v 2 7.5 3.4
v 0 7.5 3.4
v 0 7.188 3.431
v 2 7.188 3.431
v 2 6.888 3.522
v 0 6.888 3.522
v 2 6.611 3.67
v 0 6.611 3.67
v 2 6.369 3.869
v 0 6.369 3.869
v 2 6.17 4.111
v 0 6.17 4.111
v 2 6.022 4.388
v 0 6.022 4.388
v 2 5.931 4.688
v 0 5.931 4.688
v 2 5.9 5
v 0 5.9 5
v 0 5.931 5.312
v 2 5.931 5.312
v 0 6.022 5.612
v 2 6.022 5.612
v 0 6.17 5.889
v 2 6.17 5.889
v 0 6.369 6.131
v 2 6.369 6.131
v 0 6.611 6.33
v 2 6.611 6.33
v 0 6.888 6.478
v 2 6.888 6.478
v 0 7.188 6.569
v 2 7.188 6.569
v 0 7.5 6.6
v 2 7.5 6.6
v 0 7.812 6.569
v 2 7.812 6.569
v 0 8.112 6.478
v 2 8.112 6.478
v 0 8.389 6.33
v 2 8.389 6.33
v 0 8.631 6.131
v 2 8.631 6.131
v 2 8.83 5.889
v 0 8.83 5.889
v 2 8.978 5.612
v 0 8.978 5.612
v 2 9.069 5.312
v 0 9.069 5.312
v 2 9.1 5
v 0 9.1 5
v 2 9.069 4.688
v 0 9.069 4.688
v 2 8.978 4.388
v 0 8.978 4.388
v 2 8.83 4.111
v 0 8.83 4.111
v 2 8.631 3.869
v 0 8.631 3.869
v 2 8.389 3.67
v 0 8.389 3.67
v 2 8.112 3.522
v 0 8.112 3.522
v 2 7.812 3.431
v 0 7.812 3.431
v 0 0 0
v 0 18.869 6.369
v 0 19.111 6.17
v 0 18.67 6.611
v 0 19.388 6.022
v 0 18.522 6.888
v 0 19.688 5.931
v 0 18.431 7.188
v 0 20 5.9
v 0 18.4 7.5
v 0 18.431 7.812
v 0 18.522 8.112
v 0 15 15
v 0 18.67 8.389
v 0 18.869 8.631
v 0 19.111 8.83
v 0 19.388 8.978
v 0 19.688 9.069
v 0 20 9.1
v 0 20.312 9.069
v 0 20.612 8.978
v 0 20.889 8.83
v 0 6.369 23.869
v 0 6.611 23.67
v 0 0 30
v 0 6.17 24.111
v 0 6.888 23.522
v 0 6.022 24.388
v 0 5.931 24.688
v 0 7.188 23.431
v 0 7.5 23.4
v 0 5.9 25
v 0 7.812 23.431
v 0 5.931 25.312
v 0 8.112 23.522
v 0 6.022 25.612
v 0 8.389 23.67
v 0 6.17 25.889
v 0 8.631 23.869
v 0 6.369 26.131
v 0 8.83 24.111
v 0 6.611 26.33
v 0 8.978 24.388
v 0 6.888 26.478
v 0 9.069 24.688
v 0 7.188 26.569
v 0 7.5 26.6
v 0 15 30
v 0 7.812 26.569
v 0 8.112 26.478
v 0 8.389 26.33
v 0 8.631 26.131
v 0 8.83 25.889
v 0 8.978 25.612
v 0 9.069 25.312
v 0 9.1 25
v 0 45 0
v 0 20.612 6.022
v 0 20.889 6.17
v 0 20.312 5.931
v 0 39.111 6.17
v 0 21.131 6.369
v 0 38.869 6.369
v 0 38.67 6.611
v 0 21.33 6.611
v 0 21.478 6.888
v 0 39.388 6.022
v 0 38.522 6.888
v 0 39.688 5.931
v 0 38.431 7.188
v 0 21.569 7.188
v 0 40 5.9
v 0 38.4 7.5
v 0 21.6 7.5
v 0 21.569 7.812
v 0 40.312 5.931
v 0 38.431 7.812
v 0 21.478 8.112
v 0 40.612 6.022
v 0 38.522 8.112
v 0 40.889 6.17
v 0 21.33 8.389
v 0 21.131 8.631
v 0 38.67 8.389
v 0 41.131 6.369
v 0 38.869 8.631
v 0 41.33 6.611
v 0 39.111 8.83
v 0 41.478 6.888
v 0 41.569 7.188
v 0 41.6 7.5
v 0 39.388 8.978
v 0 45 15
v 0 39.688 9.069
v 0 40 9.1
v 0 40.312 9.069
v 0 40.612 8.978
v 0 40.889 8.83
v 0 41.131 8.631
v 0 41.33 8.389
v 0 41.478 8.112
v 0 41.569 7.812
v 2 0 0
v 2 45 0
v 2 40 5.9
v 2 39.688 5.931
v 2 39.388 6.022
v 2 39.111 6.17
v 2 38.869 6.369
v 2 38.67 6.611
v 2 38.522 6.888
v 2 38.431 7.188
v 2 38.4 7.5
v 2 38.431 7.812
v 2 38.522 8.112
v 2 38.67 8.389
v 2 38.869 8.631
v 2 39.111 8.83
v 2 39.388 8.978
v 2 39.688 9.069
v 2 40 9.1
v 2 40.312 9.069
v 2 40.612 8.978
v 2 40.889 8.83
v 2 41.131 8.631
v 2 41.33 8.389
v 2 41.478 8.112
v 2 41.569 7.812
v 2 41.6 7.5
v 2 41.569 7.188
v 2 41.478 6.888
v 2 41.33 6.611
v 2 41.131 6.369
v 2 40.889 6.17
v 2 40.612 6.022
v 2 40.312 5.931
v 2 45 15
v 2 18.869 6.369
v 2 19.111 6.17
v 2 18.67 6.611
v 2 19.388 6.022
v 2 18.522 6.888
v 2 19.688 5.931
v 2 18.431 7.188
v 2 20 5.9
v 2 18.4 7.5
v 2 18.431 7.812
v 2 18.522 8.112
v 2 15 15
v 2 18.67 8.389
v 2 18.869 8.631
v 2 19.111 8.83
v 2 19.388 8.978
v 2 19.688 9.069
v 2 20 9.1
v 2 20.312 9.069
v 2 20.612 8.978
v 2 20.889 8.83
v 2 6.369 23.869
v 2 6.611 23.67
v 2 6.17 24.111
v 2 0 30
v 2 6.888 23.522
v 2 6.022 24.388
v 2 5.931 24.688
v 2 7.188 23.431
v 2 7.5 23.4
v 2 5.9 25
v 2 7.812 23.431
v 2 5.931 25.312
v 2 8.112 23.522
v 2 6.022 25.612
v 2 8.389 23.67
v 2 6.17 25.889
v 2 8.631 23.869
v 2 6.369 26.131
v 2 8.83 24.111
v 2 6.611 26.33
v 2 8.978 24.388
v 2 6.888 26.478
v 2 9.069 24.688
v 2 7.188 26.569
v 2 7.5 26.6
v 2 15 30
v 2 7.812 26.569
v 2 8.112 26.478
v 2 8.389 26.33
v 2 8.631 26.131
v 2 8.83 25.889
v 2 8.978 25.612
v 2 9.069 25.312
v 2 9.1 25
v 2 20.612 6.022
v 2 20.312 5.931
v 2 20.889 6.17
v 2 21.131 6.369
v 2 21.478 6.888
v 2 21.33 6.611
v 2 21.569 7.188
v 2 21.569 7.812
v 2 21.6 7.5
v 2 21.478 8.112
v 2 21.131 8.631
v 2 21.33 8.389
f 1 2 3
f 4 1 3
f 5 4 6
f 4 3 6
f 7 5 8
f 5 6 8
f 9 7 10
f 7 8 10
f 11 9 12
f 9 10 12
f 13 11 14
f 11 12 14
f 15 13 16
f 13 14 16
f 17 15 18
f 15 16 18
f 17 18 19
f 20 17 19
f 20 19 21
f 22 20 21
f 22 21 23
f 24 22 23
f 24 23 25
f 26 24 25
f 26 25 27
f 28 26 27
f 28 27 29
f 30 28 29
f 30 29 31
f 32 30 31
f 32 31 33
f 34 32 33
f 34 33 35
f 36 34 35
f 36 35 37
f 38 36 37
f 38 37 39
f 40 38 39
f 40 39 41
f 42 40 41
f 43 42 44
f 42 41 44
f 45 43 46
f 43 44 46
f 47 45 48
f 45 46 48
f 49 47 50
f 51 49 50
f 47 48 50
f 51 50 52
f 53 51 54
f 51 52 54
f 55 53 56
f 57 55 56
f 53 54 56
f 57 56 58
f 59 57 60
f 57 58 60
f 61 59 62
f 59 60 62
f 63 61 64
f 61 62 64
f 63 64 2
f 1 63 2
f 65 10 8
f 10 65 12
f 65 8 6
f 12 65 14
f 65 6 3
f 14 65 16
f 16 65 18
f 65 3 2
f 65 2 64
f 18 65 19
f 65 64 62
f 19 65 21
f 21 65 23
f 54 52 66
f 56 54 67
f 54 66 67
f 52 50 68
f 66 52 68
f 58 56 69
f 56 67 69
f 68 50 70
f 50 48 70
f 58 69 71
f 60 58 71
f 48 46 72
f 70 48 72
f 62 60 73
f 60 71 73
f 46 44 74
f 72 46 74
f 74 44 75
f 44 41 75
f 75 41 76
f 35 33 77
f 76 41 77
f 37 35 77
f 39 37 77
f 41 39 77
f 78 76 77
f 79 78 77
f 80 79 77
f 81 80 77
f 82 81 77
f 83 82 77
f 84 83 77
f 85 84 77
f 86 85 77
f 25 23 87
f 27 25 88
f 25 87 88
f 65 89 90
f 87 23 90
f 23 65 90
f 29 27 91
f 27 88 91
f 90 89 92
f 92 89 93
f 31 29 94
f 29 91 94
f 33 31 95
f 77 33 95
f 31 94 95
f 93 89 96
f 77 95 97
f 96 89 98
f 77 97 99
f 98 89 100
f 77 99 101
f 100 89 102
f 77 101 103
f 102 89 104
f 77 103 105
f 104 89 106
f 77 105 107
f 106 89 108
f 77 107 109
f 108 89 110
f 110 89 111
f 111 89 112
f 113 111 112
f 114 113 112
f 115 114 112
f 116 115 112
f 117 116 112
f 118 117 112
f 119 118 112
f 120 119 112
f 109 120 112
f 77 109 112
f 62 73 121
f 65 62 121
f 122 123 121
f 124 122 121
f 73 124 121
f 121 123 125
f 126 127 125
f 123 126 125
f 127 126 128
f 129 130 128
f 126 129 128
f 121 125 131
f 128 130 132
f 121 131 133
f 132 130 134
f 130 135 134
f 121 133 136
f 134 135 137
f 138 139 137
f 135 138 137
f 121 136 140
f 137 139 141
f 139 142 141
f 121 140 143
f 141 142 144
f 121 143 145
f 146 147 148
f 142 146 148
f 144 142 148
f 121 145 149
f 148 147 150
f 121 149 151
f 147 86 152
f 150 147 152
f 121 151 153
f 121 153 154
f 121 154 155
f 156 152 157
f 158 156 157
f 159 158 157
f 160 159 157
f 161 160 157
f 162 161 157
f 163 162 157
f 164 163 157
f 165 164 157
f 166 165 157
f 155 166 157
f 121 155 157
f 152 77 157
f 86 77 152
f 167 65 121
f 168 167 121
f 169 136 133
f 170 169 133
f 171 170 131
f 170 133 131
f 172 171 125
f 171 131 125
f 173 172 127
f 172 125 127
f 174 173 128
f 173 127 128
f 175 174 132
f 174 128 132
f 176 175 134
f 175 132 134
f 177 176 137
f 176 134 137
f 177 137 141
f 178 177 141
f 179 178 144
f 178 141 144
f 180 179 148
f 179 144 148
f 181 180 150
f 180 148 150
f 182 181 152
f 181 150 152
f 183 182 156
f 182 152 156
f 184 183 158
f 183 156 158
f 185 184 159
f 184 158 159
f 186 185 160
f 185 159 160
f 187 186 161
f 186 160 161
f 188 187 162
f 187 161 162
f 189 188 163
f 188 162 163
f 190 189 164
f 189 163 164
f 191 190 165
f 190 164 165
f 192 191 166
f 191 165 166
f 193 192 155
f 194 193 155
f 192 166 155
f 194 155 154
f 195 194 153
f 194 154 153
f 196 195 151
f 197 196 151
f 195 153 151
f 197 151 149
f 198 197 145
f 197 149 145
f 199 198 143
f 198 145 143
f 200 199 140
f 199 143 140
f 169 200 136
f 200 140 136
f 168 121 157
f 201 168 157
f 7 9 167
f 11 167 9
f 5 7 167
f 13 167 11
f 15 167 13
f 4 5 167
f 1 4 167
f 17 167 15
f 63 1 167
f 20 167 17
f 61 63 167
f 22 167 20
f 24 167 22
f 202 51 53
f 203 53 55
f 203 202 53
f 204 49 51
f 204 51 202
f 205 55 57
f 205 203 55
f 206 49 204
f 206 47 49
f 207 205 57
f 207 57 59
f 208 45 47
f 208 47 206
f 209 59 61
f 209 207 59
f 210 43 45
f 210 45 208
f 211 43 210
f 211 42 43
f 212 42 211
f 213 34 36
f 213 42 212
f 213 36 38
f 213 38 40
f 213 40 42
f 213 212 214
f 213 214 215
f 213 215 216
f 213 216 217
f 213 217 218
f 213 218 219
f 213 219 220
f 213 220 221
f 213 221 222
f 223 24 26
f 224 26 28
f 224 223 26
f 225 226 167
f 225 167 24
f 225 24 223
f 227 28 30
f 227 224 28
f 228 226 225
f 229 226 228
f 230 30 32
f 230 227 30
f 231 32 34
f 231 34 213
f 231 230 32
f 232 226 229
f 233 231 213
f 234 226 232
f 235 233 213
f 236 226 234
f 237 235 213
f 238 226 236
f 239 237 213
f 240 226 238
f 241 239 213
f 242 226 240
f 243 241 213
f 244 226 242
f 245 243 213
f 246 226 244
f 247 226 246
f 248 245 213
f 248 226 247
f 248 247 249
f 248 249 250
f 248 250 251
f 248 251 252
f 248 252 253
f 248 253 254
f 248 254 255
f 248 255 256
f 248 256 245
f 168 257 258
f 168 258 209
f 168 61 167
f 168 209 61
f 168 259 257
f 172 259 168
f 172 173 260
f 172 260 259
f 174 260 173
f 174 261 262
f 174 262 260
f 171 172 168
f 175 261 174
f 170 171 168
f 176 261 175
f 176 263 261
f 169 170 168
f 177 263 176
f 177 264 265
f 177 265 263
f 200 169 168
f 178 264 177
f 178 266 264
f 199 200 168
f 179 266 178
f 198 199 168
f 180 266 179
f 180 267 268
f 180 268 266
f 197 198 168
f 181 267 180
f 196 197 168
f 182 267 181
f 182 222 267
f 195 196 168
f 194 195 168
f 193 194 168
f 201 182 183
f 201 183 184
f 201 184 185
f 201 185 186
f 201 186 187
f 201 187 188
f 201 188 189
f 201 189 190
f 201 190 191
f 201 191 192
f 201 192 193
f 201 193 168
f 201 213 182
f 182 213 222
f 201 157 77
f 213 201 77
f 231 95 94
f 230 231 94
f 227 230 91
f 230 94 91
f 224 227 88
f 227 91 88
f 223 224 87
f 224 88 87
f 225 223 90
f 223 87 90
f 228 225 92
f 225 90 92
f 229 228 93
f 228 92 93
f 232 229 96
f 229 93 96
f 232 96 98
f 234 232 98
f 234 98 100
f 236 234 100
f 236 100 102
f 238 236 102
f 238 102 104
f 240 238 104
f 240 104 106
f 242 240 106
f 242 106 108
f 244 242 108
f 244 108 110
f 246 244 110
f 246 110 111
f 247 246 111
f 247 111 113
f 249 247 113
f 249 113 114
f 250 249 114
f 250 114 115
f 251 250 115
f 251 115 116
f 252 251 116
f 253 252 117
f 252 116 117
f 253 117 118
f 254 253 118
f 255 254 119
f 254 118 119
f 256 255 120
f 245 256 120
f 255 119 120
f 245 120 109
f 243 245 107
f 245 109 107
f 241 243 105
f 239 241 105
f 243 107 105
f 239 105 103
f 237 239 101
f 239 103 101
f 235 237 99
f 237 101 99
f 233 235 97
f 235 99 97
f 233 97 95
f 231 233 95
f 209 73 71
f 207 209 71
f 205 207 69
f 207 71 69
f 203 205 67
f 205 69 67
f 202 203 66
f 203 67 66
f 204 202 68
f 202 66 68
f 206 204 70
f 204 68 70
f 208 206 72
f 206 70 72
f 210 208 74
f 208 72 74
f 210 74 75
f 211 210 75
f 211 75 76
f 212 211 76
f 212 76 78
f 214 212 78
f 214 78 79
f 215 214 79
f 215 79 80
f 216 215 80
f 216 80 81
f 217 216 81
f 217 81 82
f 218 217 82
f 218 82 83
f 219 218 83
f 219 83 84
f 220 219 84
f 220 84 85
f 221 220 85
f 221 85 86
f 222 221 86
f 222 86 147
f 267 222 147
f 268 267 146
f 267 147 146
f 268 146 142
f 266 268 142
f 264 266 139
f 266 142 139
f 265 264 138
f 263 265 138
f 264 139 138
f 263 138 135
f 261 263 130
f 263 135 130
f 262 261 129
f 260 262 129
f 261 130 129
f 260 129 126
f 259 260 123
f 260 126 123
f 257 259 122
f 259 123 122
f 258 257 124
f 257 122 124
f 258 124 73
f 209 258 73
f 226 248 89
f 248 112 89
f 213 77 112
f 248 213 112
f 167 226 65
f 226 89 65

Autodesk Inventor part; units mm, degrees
ref_plane "YZ Plane" through (0, 0, 0) normal (1, 0, 0) x (0, 1, 0)
ref_plane "XZ Plane" through (0, 0, 0) normal (0, 1, 0) x (-1, 0, 0)
ref_plane "XY Plane" through (0, 0, 0) normal (0, 0, 1) x (1, 0, 0)
sketch "スケッチ1" plane through (0, 0, 0) normal (1, 0, 0) x (0, 1, 0)
  line L0 (0, 0) -> (45, 0)
  line L1 (45, 0) -> (45, 15)
  line L2 (45, 15) -> (0, 15)
  line L3 (0, 15) -> (0, 0)
  line L4 (0, 0) -> (15, 0)
  line L5 (15, 0) -> (15, 30)
  line L6 (15, 30) -> (0, 30)
  line L7 (0, 30) -> (0, 0)
  point P0 (0, 15)
  point P1 (15, 15)
  dimension "d0" = 15
  dimension "d1" = 15
  dimension "d2" = 30
  dimension "d3" = 30
extrude "押し出し1" add sketch "スケッチ1" along normal blind 2
sketch "スケッチ2" plane through (2, 0, 0) normal (1, 0, 0) x (0, 0, -1)
  line L0 (-30, 15) -> (-30, 0) projected
  line L1 (-30, 7.5) -> (0, 7.5) construction
  line L2 (0, 0) -> (0, 45) projected
  line L3 (0, 45) -> (-15, 45) projected
  line L4 (-7.5, 45) -> (-7.5, 0) construction
  line L5 (-30, 0) -> (0, 0) projected
  point P0 (-25, 7.5)
  point P1 (-5, 7.5)
  point P2 (-7.5, 20)
  point P3 (-7.5, 40)
  dimension "d6" = 20
  dimension "d7" = 5
  dimension "d8" = 20
  dimension "d9" = 5
hole "穴1" at (2, 7.5, 25) at (2, 7.5, 5) at (2, 20, 7.5) at (2, 40, 7.5) direction (-1, 0, 0) diameter 3.2 end through all
properties part number "FrameJointL1515" material "アルミニウム 6061"
